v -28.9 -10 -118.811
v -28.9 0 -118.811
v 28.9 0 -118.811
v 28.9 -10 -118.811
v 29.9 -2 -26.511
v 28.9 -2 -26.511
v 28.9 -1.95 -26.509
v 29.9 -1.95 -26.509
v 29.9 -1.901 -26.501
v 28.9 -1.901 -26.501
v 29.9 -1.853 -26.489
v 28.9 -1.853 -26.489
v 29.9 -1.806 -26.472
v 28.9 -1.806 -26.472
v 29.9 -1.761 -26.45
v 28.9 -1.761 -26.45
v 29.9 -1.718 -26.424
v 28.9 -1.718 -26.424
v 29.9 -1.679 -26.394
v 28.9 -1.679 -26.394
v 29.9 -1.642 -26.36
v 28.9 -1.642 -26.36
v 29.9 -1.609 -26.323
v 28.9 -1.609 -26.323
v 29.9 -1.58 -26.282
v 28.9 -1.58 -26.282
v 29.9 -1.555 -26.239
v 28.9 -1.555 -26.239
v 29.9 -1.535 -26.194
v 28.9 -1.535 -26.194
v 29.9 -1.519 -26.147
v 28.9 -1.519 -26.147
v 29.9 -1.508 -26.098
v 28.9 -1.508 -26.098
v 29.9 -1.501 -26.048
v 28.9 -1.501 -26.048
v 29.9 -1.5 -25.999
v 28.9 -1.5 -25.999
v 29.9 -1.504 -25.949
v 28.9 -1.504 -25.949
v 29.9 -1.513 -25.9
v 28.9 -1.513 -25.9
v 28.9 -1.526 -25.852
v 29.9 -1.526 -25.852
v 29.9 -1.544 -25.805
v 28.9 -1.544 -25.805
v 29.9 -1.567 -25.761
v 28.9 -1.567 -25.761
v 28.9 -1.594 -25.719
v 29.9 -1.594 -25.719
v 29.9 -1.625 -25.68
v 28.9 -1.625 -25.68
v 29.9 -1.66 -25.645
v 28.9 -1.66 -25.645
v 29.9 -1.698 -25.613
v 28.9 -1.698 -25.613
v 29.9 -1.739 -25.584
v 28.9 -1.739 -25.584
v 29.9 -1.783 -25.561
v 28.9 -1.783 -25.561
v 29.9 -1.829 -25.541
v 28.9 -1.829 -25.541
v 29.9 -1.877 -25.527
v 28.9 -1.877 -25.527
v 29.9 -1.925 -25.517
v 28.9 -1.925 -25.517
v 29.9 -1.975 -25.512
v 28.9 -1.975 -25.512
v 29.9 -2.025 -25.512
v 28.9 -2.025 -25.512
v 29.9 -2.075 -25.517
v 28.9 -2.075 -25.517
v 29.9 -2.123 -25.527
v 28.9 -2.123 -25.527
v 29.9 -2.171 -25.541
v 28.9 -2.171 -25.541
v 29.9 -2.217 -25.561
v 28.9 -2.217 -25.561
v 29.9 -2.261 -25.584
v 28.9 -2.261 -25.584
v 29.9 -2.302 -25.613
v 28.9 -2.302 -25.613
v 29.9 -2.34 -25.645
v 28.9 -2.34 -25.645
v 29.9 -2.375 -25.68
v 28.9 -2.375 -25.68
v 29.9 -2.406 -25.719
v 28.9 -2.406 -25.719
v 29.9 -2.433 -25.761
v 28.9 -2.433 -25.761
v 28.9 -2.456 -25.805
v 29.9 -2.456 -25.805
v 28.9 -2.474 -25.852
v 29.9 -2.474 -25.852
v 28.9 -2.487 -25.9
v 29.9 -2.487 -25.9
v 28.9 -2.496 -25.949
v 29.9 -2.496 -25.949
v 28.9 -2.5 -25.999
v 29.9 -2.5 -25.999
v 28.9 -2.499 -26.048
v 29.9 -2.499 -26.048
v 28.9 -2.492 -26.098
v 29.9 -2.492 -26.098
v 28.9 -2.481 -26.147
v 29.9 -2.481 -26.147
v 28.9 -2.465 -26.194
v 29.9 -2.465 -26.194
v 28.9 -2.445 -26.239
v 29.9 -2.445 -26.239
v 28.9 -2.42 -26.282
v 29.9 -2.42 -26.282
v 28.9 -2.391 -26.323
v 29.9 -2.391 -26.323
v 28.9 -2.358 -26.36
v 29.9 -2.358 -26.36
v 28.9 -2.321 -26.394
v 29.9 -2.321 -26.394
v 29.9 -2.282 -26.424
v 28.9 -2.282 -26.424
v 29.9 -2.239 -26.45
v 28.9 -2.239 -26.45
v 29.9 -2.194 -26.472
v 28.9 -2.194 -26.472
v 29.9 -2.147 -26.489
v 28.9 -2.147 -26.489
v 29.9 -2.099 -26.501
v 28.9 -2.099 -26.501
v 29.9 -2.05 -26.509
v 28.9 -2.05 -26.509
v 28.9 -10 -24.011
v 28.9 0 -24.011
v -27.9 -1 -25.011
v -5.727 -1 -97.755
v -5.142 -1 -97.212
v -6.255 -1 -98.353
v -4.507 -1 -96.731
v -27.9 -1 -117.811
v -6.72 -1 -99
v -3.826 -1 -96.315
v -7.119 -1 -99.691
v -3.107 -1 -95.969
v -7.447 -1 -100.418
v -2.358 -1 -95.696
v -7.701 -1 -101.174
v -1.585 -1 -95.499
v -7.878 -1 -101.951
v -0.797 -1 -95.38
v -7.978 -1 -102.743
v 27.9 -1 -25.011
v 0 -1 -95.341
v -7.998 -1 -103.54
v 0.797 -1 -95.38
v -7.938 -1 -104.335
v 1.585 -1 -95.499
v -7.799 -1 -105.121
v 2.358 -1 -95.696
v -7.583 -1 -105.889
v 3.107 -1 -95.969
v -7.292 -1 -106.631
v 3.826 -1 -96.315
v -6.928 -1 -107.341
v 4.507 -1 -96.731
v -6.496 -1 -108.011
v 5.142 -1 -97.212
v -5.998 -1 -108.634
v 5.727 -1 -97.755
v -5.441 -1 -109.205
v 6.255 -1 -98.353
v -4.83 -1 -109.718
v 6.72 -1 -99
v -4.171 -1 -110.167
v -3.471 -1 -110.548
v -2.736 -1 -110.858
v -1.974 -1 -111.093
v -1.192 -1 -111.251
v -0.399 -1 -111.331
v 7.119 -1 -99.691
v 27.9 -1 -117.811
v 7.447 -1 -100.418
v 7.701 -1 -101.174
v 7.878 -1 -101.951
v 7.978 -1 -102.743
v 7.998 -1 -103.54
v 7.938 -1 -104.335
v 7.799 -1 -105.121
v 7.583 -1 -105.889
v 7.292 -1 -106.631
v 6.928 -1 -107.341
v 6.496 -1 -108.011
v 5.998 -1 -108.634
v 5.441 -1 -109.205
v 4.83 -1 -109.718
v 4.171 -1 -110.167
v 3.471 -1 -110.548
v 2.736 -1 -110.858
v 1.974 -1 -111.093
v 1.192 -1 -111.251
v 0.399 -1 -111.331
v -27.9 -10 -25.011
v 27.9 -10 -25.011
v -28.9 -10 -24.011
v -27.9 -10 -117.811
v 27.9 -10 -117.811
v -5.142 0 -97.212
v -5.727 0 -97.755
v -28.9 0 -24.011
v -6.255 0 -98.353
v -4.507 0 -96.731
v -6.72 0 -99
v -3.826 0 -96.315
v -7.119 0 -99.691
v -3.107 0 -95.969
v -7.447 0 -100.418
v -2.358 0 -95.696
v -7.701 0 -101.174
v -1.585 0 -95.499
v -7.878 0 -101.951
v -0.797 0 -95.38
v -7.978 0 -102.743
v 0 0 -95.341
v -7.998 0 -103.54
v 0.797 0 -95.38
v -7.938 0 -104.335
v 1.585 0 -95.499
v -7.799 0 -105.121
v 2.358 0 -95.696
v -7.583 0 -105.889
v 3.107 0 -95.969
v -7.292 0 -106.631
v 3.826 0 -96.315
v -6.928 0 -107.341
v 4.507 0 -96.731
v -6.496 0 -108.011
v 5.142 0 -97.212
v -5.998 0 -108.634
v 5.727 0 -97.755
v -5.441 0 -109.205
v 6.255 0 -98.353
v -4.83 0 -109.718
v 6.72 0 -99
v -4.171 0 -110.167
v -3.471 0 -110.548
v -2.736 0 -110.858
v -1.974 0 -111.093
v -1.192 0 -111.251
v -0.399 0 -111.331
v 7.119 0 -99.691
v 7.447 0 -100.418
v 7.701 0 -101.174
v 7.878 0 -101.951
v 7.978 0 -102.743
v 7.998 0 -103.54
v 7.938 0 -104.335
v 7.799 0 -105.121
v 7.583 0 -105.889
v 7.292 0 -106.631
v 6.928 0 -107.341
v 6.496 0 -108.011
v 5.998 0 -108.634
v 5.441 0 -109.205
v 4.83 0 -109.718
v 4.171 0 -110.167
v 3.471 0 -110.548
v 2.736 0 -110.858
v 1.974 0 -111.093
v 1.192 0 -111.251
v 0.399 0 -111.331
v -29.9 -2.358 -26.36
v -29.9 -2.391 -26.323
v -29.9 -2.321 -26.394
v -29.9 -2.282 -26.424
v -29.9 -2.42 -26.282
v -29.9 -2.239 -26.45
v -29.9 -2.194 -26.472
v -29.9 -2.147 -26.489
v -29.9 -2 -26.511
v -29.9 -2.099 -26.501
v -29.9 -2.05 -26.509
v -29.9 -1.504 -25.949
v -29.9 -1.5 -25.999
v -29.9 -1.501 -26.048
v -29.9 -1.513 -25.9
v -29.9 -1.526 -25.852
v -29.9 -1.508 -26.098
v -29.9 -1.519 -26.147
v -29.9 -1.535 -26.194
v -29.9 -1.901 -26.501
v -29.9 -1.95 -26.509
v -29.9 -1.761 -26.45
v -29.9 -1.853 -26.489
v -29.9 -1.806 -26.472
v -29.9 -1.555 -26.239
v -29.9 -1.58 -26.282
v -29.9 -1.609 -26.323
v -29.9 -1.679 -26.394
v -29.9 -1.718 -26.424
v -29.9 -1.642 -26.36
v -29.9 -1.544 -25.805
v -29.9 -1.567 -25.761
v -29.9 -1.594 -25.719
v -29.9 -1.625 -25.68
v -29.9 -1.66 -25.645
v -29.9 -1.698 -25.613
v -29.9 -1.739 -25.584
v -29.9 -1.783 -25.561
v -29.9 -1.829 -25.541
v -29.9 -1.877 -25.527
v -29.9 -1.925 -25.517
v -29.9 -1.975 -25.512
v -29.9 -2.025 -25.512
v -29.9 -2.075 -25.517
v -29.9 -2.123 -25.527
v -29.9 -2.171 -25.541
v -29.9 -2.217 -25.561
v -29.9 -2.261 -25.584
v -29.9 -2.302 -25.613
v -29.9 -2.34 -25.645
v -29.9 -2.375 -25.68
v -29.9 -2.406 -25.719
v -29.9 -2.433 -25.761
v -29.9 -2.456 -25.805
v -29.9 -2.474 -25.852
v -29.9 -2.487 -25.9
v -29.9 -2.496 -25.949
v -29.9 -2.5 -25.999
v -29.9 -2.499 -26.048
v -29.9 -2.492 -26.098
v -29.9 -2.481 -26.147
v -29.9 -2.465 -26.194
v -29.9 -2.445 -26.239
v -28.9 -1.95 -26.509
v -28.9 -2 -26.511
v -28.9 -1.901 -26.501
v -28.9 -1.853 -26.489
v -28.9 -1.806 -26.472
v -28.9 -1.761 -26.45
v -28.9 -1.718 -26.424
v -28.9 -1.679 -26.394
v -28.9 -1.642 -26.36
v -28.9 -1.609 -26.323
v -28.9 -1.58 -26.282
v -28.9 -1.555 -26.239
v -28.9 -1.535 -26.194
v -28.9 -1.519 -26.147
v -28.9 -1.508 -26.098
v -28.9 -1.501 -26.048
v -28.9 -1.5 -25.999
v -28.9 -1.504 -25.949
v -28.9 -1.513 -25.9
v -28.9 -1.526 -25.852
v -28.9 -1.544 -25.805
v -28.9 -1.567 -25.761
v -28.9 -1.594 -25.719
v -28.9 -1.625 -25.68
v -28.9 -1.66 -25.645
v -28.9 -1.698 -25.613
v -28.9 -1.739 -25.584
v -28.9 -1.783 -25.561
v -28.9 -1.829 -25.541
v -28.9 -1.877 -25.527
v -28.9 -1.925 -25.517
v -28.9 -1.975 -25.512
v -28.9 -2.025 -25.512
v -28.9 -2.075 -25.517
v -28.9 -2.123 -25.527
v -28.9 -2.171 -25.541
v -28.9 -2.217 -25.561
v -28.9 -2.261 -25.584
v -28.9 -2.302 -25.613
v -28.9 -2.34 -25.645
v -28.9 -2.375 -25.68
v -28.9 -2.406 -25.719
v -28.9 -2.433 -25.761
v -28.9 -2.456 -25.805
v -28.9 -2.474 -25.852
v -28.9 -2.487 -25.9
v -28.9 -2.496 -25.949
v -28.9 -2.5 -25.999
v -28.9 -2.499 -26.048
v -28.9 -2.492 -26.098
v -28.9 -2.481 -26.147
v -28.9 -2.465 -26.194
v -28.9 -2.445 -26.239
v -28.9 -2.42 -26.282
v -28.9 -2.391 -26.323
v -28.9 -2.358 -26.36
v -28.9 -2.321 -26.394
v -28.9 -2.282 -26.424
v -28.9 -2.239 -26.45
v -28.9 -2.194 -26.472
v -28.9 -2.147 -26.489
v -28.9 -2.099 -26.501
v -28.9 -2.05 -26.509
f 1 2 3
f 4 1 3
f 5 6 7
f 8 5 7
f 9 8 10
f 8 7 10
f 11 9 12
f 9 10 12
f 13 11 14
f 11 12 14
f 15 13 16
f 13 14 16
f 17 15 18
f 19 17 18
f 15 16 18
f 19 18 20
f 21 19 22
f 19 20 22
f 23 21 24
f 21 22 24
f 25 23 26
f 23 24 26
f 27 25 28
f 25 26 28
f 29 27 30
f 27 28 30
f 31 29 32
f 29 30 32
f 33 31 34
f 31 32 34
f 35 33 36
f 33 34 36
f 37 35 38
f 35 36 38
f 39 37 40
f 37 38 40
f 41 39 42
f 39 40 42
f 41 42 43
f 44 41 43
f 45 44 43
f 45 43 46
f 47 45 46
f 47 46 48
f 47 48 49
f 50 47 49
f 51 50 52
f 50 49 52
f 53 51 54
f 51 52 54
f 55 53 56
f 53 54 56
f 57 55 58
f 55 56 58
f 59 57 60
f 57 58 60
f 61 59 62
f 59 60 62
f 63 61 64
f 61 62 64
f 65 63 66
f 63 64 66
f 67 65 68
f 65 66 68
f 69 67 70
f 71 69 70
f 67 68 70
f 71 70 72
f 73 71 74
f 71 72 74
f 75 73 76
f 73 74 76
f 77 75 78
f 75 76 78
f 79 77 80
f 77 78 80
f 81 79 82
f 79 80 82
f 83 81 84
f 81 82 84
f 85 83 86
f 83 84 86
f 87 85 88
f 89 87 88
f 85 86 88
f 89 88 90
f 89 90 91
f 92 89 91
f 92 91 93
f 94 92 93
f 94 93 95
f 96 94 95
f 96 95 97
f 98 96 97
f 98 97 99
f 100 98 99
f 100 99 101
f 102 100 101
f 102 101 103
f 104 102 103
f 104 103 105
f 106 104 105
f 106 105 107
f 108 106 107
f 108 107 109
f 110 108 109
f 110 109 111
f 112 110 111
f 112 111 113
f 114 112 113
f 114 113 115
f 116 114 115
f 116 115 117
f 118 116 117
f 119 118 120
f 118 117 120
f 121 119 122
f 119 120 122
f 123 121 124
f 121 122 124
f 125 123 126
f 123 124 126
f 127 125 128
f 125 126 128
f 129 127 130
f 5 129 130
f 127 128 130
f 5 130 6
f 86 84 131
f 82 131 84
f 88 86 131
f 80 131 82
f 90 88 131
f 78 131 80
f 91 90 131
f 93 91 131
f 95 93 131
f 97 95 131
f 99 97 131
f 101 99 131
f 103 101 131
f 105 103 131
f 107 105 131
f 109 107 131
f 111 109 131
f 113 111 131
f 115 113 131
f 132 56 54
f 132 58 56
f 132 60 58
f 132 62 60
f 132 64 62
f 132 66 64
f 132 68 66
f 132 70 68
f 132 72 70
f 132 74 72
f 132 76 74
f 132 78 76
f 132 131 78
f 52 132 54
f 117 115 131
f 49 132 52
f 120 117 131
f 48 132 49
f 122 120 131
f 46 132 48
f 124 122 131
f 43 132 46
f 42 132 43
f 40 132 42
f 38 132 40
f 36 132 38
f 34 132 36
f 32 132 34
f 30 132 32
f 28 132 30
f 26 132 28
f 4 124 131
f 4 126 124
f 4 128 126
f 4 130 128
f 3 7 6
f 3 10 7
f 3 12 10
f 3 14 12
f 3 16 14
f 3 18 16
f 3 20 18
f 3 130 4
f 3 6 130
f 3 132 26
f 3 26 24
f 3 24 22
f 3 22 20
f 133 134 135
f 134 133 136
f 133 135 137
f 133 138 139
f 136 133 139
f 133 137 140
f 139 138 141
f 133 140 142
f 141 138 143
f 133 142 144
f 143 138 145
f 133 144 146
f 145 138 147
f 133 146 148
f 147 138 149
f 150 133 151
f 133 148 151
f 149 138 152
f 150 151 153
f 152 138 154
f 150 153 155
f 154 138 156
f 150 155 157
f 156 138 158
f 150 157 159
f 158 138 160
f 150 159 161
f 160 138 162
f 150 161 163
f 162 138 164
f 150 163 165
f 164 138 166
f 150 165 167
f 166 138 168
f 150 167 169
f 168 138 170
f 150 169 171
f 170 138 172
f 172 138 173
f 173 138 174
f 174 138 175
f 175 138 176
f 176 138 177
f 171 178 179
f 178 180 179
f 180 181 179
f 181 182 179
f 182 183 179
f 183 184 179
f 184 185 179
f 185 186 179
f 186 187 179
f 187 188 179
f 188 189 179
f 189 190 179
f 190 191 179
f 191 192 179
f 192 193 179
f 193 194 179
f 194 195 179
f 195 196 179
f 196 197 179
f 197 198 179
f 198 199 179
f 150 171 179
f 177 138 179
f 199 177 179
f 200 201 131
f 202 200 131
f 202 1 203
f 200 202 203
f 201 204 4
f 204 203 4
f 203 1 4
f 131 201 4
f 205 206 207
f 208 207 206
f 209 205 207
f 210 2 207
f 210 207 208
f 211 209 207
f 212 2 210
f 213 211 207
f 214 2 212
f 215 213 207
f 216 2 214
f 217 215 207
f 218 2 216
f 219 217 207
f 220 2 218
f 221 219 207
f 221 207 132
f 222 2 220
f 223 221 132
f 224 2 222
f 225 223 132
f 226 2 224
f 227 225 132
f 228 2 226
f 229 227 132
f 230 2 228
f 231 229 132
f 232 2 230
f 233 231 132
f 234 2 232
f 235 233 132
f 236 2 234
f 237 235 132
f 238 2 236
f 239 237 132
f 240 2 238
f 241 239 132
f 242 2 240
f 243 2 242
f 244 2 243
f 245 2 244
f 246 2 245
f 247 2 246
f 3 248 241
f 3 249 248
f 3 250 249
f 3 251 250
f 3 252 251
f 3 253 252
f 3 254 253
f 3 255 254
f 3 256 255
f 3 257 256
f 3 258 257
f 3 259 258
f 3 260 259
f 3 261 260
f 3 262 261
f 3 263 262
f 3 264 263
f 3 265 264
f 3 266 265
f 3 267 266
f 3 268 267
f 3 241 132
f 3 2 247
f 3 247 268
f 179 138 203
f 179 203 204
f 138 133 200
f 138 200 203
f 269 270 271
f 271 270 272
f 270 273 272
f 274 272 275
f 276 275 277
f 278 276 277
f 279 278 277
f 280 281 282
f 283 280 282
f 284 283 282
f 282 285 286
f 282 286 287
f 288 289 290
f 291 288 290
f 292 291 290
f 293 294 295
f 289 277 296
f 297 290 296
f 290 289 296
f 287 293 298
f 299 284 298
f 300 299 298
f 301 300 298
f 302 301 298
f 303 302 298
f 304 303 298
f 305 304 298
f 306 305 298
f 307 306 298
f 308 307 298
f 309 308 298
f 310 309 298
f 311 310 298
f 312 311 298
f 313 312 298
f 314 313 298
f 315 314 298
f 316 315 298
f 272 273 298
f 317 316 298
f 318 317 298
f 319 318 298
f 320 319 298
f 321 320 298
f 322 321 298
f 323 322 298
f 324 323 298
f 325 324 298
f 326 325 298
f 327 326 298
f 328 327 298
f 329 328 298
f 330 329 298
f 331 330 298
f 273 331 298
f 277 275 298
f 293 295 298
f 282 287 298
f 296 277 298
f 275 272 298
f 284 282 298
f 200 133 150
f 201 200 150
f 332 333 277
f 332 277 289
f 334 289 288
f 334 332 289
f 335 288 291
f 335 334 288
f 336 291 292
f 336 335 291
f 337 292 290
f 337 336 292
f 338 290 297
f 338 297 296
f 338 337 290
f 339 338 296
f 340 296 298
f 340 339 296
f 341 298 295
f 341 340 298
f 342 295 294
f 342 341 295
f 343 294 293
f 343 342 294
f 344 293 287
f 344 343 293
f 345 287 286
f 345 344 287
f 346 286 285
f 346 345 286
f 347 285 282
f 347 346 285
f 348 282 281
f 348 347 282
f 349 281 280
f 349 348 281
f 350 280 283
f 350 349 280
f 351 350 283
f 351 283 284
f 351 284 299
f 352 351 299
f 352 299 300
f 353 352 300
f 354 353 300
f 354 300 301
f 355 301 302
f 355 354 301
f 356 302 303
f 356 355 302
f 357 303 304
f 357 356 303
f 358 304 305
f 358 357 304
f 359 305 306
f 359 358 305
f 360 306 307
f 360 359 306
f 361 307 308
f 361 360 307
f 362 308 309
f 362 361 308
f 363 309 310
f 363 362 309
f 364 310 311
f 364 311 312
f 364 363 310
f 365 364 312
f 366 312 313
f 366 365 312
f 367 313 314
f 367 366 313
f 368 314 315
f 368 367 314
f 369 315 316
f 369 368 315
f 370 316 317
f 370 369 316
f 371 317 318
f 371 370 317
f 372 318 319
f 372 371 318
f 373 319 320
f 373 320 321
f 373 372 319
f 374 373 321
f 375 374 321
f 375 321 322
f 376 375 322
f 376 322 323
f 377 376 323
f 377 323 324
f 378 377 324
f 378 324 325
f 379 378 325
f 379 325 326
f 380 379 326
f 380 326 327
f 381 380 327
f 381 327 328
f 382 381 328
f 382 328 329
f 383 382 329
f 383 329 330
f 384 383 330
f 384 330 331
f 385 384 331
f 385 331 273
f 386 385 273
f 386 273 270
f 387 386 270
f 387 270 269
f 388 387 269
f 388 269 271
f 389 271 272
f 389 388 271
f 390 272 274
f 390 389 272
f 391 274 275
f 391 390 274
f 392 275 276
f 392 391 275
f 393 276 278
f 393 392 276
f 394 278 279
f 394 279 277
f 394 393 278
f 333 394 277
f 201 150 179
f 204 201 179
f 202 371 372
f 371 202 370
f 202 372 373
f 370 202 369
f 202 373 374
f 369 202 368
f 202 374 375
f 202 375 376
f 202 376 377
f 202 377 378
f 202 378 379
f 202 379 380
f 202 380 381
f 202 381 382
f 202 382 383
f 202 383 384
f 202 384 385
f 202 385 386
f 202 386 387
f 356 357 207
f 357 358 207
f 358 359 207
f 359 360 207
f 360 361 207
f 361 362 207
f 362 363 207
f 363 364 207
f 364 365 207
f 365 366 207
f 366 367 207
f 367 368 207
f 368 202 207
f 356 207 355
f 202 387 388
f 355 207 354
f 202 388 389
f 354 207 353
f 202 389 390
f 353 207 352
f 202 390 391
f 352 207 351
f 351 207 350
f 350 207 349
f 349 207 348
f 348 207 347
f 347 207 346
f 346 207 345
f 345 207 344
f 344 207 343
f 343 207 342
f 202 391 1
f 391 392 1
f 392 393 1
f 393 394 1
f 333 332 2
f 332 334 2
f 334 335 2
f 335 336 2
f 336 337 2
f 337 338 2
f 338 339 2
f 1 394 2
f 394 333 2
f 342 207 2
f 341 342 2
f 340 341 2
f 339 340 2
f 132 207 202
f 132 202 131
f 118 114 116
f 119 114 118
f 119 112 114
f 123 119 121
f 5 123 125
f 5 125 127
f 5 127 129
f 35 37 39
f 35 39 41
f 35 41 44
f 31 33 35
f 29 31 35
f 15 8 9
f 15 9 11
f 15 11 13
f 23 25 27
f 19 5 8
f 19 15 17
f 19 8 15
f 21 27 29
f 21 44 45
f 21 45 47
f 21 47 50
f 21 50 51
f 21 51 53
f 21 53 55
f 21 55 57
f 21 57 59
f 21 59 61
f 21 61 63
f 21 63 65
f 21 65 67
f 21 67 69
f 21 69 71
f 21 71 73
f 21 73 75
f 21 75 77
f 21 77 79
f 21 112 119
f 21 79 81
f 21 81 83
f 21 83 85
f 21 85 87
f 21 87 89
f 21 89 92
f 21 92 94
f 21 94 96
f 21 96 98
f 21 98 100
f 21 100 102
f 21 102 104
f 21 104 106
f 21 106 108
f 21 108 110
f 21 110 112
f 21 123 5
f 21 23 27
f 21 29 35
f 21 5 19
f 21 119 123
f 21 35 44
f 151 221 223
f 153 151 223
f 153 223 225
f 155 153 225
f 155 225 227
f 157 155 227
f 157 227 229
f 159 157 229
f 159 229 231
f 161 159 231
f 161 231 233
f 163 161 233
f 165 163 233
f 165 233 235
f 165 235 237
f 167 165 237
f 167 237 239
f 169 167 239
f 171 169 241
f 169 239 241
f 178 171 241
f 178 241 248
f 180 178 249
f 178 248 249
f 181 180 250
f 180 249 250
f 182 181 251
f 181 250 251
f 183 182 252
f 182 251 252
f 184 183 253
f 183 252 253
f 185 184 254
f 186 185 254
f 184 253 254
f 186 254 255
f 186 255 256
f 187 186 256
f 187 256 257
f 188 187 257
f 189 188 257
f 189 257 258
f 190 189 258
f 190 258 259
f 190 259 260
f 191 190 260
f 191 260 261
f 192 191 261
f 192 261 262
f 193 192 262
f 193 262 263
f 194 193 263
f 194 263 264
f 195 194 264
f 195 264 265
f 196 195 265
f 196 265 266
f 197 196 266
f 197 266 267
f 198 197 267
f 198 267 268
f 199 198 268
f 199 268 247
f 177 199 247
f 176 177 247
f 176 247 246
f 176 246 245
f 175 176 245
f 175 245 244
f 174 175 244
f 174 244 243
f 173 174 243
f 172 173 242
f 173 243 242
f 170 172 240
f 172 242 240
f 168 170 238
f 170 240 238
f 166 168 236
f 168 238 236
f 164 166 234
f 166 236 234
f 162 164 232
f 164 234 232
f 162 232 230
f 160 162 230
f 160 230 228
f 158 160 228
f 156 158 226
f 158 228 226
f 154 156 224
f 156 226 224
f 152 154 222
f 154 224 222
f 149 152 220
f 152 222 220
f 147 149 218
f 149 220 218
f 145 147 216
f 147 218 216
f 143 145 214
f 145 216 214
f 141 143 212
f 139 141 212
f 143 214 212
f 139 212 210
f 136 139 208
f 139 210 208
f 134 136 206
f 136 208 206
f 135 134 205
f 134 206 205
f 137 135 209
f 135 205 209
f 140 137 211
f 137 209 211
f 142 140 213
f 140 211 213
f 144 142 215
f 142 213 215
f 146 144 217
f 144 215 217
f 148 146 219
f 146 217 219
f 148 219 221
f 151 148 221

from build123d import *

# Parameters (mm, degrees)
SKETCH2_W           = 57.8
SKETCH2_H           = 94.8
BOSS_EXTRUDE1_DEPTH = 10
SHELL1_T            = -1
SKETCH3_R           = 8
CUT_EXTRUDE1_DEPTH  = 123.683699502
SKETCH4_R           = 0.5
BOSS_EXTRUDE2_DEPTH = 1


with BuildPart() as part:
    # Sketch2 → Boss-Extrude1 (new body)
    with BuildSketch(Plane(origin=(0, 0, 0), x_dir=(1, 0, 0), z_dir=(0, 1, 0))):
        with Locations((0, 71.411111111)):
            Rectangle(SKETCH2_W, SKETCH2_H)
    extrude(amount=-BOSS_EXTRUDE1_DEPTH)

    # Shell1
    shell1_openings = [part.faces().sort_by_distance(p)[0] for p in [
        (0, -10, -71.411111111),
    ]]
    offset(amount=SHELL1_T, openings=shell1_openings, kind=Kind.INTERSECTION)

    # Sketch3 → Cut-Extrude1 (cut, through all)
    with BuildSketch(Plane(origin=(0, 0, 0), x_dir=(1, 0, 0), z_dir=(0, 1, 0))):
        with Locations(Location((0, 103.340669908, 0), (0, 0, 270))):
            Circle(SKETCH3_R)
    extrude(amount=-CUT_EXTRUDE1_DEPTH, mode=Mode.SUBTRACT)

    # Sketch4 → Boss-Extrude2 (add)
    with BuildSketch(Plane(origin=(28.9, 0, 0), x_dir=(0, 0, -1), z_dir=(1, 0, 0))):
        with Locations((26.011111111, -2)):
            Circle(SKETCH4_R)
    boss_extrude2 = extrude(amount=BOSS_EXTRUDE2_DEPTH)

    # Mirror1: Boss-Extrude2 across plane
    add(boss_extrude2.mirror(Plane(origin=(0, 0, 0), x_dir=(0, 0, 1), z_dir=(1, 0, 0))))


solid = part.part
